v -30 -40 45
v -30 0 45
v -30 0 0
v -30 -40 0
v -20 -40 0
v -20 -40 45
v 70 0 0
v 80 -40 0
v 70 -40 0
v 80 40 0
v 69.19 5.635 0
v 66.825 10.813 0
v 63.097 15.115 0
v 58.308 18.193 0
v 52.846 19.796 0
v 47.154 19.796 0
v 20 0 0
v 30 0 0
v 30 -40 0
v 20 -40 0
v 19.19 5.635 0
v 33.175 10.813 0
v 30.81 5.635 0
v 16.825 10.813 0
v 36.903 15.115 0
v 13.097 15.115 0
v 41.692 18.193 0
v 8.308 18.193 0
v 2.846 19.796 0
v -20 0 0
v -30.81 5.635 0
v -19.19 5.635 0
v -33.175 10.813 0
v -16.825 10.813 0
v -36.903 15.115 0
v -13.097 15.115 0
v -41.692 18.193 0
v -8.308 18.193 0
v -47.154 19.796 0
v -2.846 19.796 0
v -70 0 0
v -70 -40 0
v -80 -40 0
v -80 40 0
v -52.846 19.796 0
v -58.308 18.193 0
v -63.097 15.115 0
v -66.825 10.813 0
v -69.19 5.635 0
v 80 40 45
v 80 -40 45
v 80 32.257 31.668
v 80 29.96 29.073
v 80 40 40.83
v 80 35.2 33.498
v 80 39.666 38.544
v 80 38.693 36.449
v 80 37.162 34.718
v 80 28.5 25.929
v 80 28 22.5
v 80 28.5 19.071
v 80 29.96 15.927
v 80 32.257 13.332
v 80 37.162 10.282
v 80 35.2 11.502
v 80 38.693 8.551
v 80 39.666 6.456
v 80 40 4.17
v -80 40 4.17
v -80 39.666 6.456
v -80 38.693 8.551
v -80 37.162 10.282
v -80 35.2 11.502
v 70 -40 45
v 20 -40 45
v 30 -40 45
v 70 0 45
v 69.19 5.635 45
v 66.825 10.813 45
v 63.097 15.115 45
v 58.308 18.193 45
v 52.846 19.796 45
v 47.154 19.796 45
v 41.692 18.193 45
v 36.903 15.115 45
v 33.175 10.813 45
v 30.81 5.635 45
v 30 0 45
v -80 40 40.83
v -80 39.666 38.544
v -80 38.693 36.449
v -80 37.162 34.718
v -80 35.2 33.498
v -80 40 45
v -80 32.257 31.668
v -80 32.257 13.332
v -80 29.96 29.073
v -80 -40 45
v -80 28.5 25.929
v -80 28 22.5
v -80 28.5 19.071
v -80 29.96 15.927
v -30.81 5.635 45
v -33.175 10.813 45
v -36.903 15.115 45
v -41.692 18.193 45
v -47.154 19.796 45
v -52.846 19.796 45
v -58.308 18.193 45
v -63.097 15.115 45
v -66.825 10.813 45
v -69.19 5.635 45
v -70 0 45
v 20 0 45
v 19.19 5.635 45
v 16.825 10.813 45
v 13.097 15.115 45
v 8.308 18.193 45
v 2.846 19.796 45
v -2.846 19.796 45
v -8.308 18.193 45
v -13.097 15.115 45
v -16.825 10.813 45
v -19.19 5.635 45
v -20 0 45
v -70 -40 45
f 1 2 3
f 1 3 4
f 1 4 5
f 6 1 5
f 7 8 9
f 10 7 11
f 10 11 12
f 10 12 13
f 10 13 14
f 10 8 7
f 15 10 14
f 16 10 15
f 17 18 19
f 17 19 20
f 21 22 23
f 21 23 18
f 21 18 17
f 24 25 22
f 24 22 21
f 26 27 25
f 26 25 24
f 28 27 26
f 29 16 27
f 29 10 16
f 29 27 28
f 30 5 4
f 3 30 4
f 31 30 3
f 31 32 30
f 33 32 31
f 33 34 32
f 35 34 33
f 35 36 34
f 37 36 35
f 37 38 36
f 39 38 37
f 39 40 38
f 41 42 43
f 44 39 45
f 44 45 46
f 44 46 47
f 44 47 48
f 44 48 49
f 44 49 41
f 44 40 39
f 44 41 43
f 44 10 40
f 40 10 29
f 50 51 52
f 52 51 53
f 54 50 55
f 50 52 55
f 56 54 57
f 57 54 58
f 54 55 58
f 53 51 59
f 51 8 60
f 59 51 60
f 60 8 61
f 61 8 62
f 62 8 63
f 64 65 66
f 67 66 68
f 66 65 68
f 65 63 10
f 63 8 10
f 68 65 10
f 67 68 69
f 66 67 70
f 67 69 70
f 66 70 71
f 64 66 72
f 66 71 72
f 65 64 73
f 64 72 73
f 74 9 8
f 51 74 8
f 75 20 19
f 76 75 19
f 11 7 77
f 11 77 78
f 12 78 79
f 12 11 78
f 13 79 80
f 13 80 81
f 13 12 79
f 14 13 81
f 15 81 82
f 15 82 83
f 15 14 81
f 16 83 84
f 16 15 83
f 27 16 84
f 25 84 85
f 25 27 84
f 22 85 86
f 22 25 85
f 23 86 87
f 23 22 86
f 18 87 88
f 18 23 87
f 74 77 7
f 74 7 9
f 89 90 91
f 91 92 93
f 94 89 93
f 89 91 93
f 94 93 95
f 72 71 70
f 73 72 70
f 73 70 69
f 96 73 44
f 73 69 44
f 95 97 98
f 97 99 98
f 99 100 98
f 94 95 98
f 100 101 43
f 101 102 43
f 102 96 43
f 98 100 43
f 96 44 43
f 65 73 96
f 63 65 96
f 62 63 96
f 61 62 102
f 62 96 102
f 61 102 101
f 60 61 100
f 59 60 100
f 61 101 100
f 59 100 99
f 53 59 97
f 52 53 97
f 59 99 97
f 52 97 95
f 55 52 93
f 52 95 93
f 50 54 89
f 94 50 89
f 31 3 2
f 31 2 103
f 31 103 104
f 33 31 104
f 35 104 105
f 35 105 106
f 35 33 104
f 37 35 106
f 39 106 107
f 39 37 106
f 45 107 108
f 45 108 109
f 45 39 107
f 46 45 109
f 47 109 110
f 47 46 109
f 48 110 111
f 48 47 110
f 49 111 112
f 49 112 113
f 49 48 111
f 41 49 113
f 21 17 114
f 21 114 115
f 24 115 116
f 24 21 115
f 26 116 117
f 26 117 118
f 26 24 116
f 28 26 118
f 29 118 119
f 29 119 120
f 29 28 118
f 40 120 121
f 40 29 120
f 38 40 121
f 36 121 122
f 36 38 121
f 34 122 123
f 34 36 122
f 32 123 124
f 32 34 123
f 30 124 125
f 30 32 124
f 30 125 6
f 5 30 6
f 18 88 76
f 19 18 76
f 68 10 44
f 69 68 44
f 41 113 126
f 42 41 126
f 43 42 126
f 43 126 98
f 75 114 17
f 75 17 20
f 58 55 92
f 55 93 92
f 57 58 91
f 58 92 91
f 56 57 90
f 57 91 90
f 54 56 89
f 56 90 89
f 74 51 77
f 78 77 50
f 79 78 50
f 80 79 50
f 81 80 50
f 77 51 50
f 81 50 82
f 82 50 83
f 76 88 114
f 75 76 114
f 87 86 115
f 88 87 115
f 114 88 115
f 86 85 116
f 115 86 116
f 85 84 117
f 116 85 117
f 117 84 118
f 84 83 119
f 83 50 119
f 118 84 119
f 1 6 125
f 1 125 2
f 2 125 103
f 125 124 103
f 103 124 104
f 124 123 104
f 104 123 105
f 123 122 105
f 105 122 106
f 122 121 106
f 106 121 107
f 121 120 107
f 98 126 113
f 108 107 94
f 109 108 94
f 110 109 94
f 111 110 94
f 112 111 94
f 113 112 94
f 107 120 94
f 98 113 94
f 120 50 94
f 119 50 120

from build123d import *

# Parameters (mm, degrees)
PAD_DEPTH    = 45
SKETCH001_R  = 12
POCKET_DEPTH = 160.001
FILLET_R     = 8


with BuildPart() as part:
    # Sketch → Pad (new body)
    with BuildSketch(Plane.XY):
        with BuildLine():
            ThreePointArc((-30, 0), (-50, 20), (-70, 0))
            Line((-70, 0), (-70, -40))
            Line((-70, -40), (-80, -40))
            Line((-80, 40), (-80, -40))
            Line((80, 40), (-80, 40))
            Line((80, -40), (80, 40))
            Line((70, -40), (80, -40))
            Line((70, 0), (70, -40))
            ThreePointArc((70, 0), (49.999978, 20), (30, -4.5e-05))
            Line((30, -4.5e-05), (30, -40.000045))
            Line((20, -40.000045), (30, -40.000045))
            Line((20, -4.5e-05), (20, -40.000045))
            ThreePointArc((20, -4.5e-05), (2.2e-05, 20), (-20, 0))
            Line((-20, 0), (-20, -40))
            Line((-30, -40), (-20, -40))
            Line((-30, 0), (-30, -40))
        make_face()
    extrude(amount=PAD_DEPTH)

    # Sketch001 → Pocket (cut, through all)
    with BuildSketch(Plane(origin=(-80, 0, 0), x_dir=(0, -1, 0), z_dir=(-1, 0, 0))):
        with Locations((-40, 22.5)):
            Circle(SKETCH001_R)
    extrude(amount=-POCKET_DEPTH, mode=Mode.SUBTRACT)

    # Fillet
    fillet_edges = [part.edges().sort_by_distance(p)[0] for p in [
        (0, 40, 34.5),
        (0, 40, 10.5),
    ]]
    fillet(fillet_edges, radius=FILLET_R)


solid = part.part
